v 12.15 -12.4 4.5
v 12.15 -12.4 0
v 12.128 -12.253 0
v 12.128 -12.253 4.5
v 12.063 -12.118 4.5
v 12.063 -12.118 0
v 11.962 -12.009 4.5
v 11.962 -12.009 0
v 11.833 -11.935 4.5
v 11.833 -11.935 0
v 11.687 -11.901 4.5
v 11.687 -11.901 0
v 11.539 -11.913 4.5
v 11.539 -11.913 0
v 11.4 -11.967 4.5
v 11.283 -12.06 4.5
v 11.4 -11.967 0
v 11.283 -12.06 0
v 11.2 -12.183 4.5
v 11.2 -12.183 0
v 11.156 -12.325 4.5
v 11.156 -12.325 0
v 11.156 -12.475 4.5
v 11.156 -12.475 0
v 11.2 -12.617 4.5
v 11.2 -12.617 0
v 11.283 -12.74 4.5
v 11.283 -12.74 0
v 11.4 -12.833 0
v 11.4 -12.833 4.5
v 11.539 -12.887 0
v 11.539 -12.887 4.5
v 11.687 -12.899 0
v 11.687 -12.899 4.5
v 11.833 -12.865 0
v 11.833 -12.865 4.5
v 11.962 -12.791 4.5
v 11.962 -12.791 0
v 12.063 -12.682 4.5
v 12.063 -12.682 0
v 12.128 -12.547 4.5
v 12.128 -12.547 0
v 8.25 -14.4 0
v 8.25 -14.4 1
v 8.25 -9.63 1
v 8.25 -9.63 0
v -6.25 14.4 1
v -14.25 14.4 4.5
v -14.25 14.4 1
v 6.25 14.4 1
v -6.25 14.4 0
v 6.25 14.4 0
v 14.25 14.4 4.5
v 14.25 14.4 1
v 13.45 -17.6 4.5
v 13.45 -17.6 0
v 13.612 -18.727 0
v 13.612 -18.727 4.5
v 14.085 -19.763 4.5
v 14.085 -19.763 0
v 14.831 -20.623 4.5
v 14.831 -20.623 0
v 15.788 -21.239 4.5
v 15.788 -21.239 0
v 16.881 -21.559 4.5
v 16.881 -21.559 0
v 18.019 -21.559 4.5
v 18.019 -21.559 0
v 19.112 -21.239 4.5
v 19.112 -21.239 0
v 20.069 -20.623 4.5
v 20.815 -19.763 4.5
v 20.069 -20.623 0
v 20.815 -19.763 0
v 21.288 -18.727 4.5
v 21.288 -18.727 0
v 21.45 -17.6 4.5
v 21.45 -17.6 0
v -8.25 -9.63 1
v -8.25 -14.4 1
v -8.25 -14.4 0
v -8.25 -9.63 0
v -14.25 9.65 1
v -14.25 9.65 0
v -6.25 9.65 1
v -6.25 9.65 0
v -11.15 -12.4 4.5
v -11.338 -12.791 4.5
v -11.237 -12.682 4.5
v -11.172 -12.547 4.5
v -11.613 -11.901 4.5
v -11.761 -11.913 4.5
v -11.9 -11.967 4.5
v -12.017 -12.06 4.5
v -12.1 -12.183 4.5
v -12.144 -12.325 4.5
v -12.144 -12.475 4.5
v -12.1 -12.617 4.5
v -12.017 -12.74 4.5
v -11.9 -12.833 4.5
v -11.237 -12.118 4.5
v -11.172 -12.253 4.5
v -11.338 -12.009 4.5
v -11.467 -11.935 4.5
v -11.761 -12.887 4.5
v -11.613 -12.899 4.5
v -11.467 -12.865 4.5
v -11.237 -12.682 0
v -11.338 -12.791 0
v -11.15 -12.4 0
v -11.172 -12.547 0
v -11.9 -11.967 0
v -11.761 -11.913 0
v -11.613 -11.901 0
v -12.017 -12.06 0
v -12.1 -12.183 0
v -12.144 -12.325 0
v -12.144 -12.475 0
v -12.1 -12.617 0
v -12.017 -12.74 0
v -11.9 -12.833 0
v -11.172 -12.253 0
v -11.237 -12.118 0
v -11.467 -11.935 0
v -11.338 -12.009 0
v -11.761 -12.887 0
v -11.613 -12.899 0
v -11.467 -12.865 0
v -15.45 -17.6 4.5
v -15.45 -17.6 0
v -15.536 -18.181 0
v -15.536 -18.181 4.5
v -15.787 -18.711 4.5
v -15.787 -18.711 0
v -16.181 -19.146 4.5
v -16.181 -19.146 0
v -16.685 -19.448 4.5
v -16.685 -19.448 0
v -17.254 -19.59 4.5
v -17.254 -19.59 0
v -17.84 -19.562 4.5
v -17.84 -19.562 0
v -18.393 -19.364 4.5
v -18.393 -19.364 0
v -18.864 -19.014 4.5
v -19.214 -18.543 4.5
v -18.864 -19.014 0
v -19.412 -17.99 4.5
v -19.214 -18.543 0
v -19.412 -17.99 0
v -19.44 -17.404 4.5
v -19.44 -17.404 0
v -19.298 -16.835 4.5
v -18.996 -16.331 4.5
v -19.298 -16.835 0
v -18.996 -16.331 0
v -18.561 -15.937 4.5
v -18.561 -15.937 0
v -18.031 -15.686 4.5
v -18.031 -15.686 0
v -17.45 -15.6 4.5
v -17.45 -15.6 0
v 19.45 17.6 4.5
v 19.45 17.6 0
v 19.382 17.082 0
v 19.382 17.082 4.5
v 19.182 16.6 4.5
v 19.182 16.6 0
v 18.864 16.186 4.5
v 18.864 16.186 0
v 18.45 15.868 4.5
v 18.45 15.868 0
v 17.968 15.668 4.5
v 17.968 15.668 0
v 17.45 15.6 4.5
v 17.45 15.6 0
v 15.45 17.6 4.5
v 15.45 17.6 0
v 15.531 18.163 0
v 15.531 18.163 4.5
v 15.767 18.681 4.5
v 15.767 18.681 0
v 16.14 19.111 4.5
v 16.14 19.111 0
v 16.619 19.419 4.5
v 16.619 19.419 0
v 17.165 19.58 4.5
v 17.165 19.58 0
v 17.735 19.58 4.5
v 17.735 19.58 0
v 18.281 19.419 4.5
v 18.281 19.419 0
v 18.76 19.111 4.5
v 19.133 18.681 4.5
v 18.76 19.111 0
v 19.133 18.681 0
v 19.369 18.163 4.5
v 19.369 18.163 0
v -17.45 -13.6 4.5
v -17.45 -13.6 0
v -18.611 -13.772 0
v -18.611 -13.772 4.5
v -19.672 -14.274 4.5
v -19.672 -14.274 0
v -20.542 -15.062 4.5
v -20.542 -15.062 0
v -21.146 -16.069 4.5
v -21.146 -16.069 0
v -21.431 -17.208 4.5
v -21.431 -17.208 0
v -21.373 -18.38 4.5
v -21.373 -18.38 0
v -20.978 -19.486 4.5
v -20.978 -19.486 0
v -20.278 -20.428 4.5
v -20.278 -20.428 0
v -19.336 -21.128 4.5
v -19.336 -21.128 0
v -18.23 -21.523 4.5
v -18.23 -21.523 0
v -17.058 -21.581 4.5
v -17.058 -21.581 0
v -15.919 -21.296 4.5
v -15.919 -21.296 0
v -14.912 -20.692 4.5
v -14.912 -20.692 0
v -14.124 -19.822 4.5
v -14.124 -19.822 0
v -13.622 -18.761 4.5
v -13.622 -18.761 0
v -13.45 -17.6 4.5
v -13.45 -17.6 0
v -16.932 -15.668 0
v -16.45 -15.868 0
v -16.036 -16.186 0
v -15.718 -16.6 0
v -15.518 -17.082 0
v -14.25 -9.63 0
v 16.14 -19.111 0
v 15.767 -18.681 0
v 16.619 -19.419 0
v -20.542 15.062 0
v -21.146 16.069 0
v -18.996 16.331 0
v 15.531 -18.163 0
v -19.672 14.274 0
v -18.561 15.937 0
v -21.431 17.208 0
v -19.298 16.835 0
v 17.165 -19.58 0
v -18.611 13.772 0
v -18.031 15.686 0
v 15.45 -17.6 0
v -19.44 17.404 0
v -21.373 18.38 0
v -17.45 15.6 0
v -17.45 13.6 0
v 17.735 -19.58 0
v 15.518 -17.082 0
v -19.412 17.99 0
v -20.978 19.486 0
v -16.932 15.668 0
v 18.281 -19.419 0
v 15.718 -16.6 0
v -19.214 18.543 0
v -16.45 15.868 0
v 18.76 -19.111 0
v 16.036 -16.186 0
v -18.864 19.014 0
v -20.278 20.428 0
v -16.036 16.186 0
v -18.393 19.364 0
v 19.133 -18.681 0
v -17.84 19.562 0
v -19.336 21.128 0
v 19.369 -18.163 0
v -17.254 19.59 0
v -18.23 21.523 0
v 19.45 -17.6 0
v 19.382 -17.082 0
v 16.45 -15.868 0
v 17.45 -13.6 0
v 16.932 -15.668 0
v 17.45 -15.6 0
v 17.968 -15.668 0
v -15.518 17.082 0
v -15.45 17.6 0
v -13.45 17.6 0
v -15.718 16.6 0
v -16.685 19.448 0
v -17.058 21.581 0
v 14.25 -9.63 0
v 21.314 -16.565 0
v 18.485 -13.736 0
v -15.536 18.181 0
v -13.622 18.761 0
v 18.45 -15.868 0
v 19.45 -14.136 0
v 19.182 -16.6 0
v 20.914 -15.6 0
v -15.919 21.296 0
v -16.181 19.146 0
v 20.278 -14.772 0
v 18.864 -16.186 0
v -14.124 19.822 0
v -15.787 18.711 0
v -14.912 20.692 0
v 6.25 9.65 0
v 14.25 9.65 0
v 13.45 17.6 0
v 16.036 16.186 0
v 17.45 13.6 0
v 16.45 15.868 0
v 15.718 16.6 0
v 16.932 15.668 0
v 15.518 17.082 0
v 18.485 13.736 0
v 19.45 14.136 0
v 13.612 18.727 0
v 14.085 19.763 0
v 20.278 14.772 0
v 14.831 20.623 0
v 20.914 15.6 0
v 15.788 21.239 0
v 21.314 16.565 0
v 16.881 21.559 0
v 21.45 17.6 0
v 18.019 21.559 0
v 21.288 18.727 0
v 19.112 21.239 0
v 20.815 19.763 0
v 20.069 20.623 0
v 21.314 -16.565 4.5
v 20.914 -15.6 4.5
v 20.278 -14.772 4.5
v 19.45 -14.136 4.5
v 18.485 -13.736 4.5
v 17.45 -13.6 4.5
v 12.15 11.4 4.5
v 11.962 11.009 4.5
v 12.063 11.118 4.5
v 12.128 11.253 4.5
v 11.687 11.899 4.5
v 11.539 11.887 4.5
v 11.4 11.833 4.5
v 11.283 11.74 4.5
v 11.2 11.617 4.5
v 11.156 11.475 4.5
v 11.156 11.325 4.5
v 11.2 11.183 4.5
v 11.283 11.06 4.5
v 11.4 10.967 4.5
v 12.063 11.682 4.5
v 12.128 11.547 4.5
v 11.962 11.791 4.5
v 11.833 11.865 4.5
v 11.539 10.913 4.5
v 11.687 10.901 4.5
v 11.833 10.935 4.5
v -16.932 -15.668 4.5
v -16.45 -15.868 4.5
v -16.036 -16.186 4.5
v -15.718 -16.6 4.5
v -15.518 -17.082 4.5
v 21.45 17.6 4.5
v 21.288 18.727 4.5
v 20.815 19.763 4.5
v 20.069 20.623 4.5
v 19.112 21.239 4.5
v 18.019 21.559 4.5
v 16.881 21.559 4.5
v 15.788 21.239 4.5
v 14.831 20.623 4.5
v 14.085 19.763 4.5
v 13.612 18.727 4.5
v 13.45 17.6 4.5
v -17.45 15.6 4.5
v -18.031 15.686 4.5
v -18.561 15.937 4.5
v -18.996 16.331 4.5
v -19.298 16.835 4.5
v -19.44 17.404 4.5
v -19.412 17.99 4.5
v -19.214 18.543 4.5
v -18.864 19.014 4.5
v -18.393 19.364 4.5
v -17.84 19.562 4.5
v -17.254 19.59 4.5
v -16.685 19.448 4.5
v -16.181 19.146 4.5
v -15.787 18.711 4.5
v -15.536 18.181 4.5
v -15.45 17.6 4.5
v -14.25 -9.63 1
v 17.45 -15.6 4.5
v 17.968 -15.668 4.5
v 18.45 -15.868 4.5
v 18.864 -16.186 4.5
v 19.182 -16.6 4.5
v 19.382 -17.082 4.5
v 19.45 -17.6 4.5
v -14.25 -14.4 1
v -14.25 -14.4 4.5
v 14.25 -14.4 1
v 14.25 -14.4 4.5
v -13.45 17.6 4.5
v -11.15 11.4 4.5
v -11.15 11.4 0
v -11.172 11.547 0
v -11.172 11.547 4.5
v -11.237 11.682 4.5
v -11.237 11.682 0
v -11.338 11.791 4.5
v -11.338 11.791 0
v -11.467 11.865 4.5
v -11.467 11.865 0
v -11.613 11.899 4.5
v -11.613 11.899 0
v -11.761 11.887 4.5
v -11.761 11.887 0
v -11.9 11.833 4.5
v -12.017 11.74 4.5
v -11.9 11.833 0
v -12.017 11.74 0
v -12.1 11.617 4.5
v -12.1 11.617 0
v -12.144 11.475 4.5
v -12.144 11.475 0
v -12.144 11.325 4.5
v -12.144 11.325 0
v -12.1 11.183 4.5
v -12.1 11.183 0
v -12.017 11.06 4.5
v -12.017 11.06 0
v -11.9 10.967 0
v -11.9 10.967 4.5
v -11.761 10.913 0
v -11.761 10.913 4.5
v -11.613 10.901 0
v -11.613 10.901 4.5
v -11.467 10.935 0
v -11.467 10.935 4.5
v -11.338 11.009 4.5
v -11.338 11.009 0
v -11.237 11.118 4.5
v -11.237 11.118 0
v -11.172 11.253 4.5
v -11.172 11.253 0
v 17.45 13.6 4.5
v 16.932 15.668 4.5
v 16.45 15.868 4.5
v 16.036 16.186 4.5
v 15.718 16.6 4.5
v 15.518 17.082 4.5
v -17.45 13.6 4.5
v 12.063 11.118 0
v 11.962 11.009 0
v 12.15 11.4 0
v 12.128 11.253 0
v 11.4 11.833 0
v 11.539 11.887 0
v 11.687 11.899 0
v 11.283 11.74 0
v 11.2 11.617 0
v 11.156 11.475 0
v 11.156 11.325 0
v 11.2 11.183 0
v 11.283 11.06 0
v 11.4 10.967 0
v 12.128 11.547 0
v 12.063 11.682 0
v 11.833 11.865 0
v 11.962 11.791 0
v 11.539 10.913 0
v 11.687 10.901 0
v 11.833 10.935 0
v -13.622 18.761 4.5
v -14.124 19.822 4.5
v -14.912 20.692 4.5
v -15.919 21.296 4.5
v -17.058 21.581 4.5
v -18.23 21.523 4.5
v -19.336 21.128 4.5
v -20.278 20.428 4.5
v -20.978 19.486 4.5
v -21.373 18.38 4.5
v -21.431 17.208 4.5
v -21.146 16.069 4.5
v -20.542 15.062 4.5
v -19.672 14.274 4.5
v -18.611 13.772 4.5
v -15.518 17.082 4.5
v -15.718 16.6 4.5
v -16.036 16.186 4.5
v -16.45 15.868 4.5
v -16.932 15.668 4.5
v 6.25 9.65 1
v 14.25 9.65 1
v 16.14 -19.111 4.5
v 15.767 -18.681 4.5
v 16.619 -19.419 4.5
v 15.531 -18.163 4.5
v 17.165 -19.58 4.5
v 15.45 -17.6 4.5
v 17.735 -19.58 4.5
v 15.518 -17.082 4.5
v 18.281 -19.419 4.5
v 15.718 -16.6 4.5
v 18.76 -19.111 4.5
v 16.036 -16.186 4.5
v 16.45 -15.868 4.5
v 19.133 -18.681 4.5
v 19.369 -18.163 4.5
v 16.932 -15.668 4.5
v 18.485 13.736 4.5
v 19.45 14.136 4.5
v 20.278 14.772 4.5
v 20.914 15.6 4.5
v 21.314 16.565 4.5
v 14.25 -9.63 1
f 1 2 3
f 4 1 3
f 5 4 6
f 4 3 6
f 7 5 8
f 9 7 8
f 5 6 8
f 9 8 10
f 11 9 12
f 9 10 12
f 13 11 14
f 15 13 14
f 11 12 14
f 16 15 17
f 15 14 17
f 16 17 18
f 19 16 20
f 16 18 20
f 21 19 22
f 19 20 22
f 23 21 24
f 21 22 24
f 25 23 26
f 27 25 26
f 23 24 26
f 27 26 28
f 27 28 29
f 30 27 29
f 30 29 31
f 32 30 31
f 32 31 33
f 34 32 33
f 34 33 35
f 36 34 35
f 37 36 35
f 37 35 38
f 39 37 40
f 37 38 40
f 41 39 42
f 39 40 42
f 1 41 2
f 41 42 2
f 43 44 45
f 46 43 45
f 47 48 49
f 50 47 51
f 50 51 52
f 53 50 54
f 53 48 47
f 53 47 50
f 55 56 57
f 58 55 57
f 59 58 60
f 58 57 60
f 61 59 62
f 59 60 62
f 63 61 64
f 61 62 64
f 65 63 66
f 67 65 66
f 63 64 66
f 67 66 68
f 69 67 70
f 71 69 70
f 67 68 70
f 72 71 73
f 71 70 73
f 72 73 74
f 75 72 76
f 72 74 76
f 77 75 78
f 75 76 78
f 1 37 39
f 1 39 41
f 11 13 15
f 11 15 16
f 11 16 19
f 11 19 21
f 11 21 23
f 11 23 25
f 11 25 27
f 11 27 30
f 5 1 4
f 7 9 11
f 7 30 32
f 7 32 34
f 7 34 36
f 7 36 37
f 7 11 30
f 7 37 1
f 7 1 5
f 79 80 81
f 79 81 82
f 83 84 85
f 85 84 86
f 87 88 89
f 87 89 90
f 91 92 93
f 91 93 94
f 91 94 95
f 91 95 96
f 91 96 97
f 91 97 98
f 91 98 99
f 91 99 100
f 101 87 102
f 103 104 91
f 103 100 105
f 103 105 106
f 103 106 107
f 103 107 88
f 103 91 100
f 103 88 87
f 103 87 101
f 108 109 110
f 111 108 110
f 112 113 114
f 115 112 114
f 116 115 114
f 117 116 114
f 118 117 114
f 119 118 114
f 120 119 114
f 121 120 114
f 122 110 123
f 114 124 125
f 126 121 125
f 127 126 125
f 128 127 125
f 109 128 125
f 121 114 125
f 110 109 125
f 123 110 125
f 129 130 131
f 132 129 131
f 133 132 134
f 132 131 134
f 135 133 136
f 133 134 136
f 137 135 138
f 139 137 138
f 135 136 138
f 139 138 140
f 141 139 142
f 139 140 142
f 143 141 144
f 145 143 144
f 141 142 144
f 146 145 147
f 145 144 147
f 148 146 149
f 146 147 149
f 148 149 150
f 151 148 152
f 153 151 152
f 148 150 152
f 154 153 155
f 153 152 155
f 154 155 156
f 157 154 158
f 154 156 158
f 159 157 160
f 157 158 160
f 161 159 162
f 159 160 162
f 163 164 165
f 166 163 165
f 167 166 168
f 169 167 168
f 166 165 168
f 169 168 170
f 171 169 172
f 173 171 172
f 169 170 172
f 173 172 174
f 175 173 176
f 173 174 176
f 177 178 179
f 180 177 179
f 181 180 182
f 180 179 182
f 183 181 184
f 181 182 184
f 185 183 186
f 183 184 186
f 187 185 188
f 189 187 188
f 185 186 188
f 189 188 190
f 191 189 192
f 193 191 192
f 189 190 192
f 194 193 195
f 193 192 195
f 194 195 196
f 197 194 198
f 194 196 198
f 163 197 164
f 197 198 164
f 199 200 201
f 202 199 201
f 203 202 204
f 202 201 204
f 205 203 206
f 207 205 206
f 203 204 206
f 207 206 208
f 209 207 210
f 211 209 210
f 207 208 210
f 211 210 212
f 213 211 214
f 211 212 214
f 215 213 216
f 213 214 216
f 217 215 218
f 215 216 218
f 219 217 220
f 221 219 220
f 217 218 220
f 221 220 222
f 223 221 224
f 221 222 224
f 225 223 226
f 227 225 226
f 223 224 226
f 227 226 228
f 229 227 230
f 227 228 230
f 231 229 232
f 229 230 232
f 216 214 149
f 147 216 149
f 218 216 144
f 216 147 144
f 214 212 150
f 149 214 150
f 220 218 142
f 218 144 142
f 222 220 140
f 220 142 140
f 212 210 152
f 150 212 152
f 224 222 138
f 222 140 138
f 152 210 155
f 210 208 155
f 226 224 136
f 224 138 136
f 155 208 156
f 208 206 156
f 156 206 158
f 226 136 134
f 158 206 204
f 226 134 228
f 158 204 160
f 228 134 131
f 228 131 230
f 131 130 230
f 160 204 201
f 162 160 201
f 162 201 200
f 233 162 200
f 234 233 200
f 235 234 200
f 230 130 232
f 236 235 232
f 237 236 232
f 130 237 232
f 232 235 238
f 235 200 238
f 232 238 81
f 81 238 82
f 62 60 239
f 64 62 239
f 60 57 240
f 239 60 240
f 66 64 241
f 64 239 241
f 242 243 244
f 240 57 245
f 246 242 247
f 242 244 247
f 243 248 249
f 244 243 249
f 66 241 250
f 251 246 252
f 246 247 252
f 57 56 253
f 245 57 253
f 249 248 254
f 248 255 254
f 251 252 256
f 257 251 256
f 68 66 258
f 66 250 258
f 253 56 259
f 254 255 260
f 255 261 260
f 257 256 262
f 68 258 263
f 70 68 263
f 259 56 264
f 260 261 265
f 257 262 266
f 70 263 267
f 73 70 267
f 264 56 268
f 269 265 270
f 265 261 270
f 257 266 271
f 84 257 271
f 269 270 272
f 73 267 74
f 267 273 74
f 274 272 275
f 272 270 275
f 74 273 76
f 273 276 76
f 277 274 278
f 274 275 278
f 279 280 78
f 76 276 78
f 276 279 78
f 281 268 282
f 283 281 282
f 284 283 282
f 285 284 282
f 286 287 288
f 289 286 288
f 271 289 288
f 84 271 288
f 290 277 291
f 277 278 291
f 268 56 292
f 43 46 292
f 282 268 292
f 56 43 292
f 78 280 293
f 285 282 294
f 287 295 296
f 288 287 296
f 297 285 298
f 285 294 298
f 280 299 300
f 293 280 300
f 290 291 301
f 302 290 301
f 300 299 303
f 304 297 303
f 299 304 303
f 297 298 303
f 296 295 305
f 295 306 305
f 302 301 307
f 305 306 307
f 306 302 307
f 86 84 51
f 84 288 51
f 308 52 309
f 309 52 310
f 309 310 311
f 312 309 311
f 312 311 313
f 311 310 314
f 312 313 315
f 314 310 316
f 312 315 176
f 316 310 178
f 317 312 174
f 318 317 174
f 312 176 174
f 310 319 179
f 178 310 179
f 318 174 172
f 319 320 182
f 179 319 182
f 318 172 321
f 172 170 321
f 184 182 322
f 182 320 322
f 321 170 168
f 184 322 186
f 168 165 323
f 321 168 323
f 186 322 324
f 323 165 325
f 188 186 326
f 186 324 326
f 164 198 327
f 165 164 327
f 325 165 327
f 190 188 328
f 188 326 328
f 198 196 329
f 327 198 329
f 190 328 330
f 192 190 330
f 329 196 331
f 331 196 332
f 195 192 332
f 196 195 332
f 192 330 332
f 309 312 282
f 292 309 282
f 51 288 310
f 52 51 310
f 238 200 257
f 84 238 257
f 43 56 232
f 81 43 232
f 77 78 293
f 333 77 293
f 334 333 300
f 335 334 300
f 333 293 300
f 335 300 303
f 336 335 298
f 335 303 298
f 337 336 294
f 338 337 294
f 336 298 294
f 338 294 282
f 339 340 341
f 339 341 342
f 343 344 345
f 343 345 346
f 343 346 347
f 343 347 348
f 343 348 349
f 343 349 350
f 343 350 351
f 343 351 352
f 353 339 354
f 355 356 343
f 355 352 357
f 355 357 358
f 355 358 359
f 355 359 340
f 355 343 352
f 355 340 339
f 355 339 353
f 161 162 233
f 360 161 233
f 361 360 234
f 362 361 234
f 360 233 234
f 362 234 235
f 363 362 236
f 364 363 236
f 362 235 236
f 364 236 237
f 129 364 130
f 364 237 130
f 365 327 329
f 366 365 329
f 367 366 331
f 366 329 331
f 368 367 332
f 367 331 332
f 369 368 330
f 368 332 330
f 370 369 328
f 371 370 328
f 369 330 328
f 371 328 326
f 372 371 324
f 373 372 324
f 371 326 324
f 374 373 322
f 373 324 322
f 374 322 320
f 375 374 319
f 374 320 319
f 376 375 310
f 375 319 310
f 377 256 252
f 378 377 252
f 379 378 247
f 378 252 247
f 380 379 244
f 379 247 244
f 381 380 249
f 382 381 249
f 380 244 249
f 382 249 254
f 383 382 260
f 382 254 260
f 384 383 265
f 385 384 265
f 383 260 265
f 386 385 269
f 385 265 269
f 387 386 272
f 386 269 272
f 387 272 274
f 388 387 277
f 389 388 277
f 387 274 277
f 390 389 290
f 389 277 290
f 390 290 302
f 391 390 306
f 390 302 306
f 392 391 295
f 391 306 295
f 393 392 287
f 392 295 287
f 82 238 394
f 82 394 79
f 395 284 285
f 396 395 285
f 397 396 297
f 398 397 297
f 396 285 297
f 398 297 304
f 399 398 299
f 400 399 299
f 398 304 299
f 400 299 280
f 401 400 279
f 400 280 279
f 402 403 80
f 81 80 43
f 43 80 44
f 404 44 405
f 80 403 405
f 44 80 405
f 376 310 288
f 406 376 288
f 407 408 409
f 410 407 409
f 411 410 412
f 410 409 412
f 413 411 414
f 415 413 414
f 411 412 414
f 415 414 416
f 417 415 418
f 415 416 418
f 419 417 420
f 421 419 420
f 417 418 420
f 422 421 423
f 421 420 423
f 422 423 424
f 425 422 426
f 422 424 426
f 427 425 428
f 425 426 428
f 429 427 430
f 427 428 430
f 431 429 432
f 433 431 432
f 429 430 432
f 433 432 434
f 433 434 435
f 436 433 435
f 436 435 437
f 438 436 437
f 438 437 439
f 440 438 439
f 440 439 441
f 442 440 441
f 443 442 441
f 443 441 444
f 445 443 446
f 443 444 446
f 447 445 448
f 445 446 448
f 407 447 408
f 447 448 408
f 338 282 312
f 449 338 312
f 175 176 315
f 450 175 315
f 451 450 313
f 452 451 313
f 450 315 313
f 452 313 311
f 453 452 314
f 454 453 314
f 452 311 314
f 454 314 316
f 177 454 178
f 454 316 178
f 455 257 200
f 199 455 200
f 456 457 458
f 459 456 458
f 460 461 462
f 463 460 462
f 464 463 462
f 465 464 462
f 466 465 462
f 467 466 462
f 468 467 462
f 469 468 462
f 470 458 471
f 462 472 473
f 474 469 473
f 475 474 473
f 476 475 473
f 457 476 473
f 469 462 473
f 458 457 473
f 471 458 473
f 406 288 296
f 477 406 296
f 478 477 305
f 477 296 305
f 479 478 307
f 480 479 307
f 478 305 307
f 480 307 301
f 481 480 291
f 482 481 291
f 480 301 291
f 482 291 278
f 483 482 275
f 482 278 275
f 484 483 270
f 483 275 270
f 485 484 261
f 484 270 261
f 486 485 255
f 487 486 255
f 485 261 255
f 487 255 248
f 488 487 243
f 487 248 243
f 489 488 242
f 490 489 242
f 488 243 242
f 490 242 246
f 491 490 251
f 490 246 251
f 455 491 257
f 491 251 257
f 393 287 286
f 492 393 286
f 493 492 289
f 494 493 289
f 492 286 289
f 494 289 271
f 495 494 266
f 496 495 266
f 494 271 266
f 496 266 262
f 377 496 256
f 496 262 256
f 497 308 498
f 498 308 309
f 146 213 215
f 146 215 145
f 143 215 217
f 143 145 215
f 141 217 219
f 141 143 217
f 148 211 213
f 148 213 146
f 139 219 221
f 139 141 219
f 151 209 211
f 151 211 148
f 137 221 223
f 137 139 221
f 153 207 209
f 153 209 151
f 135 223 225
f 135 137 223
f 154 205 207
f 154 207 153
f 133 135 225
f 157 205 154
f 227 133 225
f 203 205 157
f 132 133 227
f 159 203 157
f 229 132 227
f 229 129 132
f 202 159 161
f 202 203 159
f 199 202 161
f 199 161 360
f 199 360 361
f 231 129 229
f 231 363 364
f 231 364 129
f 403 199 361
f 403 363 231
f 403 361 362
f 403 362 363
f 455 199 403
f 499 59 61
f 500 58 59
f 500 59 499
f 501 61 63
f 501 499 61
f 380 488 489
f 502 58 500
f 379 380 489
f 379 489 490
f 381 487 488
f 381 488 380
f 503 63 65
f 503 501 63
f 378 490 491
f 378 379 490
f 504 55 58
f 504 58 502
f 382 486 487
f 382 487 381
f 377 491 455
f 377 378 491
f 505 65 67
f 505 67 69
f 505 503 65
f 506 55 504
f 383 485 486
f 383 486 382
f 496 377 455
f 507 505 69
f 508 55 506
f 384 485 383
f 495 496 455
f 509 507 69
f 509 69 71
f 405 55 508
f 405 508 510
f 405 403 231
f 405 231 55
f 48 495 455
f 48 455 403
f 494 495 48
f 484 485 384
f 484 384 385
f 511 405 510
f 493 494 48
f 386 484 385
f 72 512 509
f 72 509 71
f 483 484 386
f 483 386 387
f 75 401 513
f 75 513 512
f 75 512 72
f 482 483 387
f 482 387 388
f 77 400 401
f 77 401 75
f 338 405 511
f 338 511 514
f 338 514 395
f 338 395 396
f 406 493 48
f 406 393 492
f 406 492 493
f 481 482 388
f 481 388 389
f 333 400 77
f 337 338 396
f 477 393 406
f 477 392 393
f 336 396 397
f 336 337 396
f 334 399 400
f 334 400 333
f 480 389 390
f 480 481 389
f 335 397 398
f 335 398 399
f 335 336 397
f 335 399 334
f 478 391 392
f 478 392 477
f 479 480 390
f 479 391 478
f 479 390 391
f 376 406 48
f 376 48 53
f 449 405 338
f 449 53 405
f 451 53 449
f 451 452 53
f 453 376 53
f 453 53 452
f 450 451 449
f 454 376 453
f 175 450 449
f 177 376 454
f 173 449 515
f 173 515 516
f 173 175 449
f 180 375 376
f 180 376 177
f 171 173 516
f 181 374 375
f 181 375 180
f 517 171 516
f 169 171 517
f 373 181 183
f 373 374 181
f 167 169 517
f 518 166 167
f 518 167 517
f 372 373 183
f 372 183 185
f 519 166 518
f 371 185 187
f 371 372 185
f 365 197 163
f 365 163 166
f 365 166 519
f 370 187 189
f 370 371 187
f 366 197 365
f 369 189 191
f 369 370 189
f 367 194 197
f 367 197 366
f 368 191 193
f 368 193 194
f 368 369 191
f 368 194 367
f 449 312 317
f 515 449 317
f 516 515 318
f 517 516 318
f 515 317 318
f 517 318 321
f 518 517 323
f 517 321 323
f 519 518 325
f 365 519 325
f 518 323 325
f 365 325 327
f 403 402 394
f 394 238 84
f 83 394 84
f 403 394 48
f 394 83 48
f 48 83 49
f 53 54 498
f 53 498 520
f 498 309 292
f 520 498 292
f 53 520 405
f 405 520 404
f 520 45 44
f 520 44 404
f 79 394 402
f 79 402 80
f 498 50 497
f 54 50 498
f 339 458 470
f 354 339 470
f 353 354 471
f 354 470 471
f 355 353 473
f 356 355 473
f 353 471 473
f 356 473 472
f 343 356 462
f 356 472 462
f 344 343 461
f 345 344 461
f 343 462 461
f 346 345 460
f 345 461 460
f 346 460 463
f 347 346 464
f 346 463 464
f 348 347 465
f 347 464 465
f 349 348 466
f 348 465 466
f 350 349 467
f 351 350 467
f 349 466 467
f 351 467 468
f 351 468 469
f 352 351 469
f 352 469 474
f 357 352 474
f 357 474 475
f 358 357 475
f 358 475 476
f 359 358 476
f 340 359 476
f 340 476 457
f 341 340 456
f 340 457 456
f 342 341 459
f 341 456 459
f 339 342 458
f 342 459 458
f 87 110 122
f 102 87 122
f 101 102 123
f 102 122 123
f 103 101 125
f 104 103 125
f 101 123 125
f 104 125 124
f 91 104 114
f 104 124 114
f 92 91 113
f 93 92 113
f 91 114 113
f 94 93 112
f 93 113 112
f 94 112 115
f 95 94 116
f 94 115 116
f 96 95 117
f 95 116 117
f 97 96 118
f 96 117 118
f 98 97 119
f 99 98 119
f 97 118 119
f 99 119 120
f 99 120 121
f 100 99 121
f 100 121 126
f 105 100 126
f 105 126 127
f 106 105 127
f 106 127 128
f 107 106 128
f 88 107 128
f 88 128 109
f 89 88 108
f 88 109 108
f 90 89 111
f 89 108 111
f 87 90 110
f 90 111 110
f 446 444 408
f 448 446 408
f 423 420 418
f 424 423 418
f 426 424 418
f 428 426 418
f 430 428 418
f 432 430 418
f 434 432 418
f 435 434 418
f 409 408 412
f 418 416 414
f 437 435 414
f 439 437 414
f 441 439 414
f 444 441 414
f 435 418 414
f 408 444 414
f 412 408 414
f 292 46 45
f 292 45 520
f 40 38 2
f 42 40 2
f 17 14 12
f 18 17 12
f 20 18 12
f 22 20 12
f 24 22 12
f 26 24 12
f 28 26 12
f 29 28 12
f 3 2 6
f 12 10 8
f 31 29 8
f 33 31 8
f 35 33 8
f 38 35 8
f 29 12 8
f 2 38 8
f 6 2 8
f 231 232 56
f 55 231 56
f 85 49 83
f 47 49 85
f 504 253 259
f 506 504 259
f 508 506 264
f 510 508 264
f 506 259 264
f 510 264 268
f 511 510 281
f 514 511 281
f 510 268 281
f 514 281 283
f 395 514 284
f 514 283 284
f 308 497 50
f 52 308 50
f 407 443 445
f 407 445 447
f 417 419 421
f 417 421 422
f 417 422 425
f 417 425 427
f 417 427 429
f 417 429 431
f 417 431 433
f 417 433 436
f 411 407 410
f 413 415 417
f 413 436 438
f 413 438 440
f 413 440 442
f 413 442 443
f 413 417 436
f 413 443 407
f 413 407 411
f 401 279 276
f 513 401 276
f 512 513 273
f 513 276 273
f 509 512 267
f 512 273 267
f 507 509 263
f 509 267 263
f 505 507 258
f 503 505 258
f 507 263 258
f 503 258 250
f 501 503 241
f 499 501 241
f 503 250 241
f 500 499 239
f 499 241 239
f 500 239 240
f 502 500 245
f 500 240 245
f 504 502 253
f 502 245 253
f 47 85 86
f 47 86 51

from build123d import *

# Parameters (mm, degrees)
F1_DEPTH = 4.5
F0_R     = 0.5
F2_W     = 28.5
F2_H     = 4.75
F2_H_2   = 4.77
F3_DEPTH = 1
F5_W     = 12.5
F5_H     = 4.75
F5_W_2   = 16.5
F5_H_2   = 4.77
F6_DEPTH = 3.5


with BuildPart() as f1:
    # F0 (on Top) → F1 (new body)
    with BuildSketch(Plane.XY):
        with BuildLine():
            Line((17.45, -13.6), (17.45, 13.6))
            ThreePointArc((17.45, 13.6), (14.6215728753, 14.7715728753), (13.45, 17.6))
            Line((13.45, 17.6), (-13.45, 17.6))
            ThreePointArc((-13.45, 17.6), (-14.6215728753, 14.7715728753), (-17.45, 13.6))
            Line((-17.45, 13.6), (-17.45, -13.6))
            ThreePointArc((-17.45, -13.6), (-14.6215728753, -14.7715728753), (-13.45, -17.6))
            Line((-13.45, -17.6), (13.45, -17.6))
            ThreePointArc((13.45, -17.6), (14.6215728753, -14.7715728753), (17.45, -13.6))
        make_face()
        Polygon((-14.25, 9.65), (-14.25, 14.4), (14.25, 14.4), (14.25, 9.65), (14.25, -9.63), (14.25, -14.4), (-14.25, -14.4), (-14.25, -9.63), align=None, mode=Mode.SUBTRACT)
        with BuildLine():
            Line((-15.45, 17.6), (-13.45, 17.6))
            ThreePointArc((-13.45, 17.6), (-20.2784271247, 20.4284271247), (-17.45, 13.6))
            Line((-17.45, 13.6), (-17.45, 15.6))
            ThreePointArc((-17.45, 15.6), (-18.8642135624, 19.0142135624), (-15.45, 17.6))
        make_face()
        with BuildLine():
            ThreePointArc((19.45, 17.6), (18.8642135624, 16.1857864376), (17.45, 15.6))
            Line((17.45, 15.6), (17.45, 13.6))
            ThreePointArc((17.45, 13.6), (20.2784271247, 14.7715728753), (21.45, 17.6))
            ThreePointArc((21.45, 17.6), (17.45, 21.6), (13.45, 17.6))
            Line((13.45, 17.6), (15.45, 17.6))
            ThreePointArc((15.45, 17.6), (17.45, 19.6), (19.45, 17.6))
        make_face()
        with BuildLine():
            ThreePointArc((21.45, -17.6), (20.2784271247, -14.7715728753), (17.45, -13.6))
            Line((17.45, -13.6), (17.45, -15.6))
            ThreePointArc((17.45, -15.6), (18.8642135624, -16.1857864376), (19.45, -17.6))
            ThreePointArc((19.45, -17.6), (17.45, -19.6), (15.45, -17.6))
            Line((15.45, -17.6), (13.45, -17.6))
            ThreePointArc((13.45, -17.6), (17.45, -21.6), (21.45, -17.6))
        make_face()
        with BuildLine():
            ThreePointArc((-17.45, -13.6), (-20.2784271247, -20.4284271247), (-13.45, -17.6))
            Line((-13.45, -17.6), (-15.45, -17.6))
            ThreePointArc((-15.45, -17.6), (-18.8642135624, -19.0142135624), (-17.45, -15.6))
            Line((-17.45, -15.6), (-17.45, -13.6))
        make_face()
        with BuildLine():
            ThreePointArc((-17.45, 13.6), (-14.6215728753, 14.7715728753), (-13.45, 17.6))
            Line((-13.45, 17.6), (-15.45, 17.6))
            ThreePointArc((-15.45, 17.6), (-16.0357864376, 16.1857864376), (-17.45, 15.6))
            Line((-17.45, 15.6), (-17.45, 13.6))
        make_face()
        with BuildLine():
            Line((17.45, 13.6), (17.45, 15.6))
            ThreePointArc((17.45, 15.6), (16.0357864376, 16.1857864376), (15.45, 17.6))
            Line((15.45, 17.6), (13.45, 17.6))
            ThreePointArc((13.45, 17.6), (14.6215728753, 14.7715728753), (17.45, 13.6))
        make_face()
        with BuildLine():
            Line((17.45, -15.6), (17.45, -13.6))
            ThreePointArc((17.45, -13.6), (14.6215728753, -14.7715728753), (13.45, -17.6))
            Line((13.45, -17.6), (15.45, -17.6))
            ThreePointArc((15.45, -17.6), (16.0357864376, -16.1857864376), (17.45, -15.6))
        make_face()
        with BuildLine():
            Line((-15.45, -17.6), (-13.45, -17.6))
            ThreePointArc((-13.45, -17.6), (-14.6215728753, -14.7715728753), (-17.45, -13.6))
            Line((-17.45, -13.6), (-17.45, -15.6))
            ThreePointArc((-17.45, -15.6), (-16.0357864376, -16.1857864376), (-15.45, -17.6))
        make_face()
    extrude(amount=F1_DEPTH)

    # F2 (on Top) → F3 (join)
    with BuildSketch(Plane.XY):
        with Locations((0, 12.025)):
            Rectangle(F2_W, F2_H)
        with Locations((0, -12.015)):
            Rectangle(F2_W, F2_H_2)
    extrude(amount=F3_DEPTH)

    # F5 (on offset) → F6 (cut)
    with BuildSketch(Plane.XY.offset(3.5)):
        with Locations((0, 12.025)):
            Rectangle(F5_W, F5_H)
        with Locations((0, -12.015)):
            Rectangle(F5_W_2, F5_H_2)
    extrude(amount=-F6_DEPTH, mode=Mode.SUBTRACT)


with BuildPart() as f1b:
    # F0 (on Top) → F1, piece 2 (new body)
    with BuildSketch(Plane.XY):
        with Locations((-11.65, 11.4)):
            Circle(F0_R)
    extrude(amount=F1_DEPTH)


with BuildPart() as f1c:
    # F0 (on Top) → F1, piece 3 (new body)
    with BuildSketch(Plane.XY):
        with Locations((11.65, 11.4)):
            Circle(F0_R)
    extrude(amount=F1_DEPTH)


with BuildPart() as f1d:
    # F0 (on Top) → F1, piece 4 (new body)
    with BuildSketch(Plane.XY):
        with Locations((11.65, -12.4)):
            Circle(F0_R)
    extrude(amount=F1_DEPTH)


with BuildPart() as f1e:
    # F0 (on Top) → F1, piece 5 (new body)
    with BuildSketch(Plane.XY):
        with Locations((-11.65, -12.4)):
            Circle(F0_R)
    extrude(amount=F1_DEPTH)


solid = Compound([f1.part, f1b.part, f1c.part, f1d.part, f1e.part])
